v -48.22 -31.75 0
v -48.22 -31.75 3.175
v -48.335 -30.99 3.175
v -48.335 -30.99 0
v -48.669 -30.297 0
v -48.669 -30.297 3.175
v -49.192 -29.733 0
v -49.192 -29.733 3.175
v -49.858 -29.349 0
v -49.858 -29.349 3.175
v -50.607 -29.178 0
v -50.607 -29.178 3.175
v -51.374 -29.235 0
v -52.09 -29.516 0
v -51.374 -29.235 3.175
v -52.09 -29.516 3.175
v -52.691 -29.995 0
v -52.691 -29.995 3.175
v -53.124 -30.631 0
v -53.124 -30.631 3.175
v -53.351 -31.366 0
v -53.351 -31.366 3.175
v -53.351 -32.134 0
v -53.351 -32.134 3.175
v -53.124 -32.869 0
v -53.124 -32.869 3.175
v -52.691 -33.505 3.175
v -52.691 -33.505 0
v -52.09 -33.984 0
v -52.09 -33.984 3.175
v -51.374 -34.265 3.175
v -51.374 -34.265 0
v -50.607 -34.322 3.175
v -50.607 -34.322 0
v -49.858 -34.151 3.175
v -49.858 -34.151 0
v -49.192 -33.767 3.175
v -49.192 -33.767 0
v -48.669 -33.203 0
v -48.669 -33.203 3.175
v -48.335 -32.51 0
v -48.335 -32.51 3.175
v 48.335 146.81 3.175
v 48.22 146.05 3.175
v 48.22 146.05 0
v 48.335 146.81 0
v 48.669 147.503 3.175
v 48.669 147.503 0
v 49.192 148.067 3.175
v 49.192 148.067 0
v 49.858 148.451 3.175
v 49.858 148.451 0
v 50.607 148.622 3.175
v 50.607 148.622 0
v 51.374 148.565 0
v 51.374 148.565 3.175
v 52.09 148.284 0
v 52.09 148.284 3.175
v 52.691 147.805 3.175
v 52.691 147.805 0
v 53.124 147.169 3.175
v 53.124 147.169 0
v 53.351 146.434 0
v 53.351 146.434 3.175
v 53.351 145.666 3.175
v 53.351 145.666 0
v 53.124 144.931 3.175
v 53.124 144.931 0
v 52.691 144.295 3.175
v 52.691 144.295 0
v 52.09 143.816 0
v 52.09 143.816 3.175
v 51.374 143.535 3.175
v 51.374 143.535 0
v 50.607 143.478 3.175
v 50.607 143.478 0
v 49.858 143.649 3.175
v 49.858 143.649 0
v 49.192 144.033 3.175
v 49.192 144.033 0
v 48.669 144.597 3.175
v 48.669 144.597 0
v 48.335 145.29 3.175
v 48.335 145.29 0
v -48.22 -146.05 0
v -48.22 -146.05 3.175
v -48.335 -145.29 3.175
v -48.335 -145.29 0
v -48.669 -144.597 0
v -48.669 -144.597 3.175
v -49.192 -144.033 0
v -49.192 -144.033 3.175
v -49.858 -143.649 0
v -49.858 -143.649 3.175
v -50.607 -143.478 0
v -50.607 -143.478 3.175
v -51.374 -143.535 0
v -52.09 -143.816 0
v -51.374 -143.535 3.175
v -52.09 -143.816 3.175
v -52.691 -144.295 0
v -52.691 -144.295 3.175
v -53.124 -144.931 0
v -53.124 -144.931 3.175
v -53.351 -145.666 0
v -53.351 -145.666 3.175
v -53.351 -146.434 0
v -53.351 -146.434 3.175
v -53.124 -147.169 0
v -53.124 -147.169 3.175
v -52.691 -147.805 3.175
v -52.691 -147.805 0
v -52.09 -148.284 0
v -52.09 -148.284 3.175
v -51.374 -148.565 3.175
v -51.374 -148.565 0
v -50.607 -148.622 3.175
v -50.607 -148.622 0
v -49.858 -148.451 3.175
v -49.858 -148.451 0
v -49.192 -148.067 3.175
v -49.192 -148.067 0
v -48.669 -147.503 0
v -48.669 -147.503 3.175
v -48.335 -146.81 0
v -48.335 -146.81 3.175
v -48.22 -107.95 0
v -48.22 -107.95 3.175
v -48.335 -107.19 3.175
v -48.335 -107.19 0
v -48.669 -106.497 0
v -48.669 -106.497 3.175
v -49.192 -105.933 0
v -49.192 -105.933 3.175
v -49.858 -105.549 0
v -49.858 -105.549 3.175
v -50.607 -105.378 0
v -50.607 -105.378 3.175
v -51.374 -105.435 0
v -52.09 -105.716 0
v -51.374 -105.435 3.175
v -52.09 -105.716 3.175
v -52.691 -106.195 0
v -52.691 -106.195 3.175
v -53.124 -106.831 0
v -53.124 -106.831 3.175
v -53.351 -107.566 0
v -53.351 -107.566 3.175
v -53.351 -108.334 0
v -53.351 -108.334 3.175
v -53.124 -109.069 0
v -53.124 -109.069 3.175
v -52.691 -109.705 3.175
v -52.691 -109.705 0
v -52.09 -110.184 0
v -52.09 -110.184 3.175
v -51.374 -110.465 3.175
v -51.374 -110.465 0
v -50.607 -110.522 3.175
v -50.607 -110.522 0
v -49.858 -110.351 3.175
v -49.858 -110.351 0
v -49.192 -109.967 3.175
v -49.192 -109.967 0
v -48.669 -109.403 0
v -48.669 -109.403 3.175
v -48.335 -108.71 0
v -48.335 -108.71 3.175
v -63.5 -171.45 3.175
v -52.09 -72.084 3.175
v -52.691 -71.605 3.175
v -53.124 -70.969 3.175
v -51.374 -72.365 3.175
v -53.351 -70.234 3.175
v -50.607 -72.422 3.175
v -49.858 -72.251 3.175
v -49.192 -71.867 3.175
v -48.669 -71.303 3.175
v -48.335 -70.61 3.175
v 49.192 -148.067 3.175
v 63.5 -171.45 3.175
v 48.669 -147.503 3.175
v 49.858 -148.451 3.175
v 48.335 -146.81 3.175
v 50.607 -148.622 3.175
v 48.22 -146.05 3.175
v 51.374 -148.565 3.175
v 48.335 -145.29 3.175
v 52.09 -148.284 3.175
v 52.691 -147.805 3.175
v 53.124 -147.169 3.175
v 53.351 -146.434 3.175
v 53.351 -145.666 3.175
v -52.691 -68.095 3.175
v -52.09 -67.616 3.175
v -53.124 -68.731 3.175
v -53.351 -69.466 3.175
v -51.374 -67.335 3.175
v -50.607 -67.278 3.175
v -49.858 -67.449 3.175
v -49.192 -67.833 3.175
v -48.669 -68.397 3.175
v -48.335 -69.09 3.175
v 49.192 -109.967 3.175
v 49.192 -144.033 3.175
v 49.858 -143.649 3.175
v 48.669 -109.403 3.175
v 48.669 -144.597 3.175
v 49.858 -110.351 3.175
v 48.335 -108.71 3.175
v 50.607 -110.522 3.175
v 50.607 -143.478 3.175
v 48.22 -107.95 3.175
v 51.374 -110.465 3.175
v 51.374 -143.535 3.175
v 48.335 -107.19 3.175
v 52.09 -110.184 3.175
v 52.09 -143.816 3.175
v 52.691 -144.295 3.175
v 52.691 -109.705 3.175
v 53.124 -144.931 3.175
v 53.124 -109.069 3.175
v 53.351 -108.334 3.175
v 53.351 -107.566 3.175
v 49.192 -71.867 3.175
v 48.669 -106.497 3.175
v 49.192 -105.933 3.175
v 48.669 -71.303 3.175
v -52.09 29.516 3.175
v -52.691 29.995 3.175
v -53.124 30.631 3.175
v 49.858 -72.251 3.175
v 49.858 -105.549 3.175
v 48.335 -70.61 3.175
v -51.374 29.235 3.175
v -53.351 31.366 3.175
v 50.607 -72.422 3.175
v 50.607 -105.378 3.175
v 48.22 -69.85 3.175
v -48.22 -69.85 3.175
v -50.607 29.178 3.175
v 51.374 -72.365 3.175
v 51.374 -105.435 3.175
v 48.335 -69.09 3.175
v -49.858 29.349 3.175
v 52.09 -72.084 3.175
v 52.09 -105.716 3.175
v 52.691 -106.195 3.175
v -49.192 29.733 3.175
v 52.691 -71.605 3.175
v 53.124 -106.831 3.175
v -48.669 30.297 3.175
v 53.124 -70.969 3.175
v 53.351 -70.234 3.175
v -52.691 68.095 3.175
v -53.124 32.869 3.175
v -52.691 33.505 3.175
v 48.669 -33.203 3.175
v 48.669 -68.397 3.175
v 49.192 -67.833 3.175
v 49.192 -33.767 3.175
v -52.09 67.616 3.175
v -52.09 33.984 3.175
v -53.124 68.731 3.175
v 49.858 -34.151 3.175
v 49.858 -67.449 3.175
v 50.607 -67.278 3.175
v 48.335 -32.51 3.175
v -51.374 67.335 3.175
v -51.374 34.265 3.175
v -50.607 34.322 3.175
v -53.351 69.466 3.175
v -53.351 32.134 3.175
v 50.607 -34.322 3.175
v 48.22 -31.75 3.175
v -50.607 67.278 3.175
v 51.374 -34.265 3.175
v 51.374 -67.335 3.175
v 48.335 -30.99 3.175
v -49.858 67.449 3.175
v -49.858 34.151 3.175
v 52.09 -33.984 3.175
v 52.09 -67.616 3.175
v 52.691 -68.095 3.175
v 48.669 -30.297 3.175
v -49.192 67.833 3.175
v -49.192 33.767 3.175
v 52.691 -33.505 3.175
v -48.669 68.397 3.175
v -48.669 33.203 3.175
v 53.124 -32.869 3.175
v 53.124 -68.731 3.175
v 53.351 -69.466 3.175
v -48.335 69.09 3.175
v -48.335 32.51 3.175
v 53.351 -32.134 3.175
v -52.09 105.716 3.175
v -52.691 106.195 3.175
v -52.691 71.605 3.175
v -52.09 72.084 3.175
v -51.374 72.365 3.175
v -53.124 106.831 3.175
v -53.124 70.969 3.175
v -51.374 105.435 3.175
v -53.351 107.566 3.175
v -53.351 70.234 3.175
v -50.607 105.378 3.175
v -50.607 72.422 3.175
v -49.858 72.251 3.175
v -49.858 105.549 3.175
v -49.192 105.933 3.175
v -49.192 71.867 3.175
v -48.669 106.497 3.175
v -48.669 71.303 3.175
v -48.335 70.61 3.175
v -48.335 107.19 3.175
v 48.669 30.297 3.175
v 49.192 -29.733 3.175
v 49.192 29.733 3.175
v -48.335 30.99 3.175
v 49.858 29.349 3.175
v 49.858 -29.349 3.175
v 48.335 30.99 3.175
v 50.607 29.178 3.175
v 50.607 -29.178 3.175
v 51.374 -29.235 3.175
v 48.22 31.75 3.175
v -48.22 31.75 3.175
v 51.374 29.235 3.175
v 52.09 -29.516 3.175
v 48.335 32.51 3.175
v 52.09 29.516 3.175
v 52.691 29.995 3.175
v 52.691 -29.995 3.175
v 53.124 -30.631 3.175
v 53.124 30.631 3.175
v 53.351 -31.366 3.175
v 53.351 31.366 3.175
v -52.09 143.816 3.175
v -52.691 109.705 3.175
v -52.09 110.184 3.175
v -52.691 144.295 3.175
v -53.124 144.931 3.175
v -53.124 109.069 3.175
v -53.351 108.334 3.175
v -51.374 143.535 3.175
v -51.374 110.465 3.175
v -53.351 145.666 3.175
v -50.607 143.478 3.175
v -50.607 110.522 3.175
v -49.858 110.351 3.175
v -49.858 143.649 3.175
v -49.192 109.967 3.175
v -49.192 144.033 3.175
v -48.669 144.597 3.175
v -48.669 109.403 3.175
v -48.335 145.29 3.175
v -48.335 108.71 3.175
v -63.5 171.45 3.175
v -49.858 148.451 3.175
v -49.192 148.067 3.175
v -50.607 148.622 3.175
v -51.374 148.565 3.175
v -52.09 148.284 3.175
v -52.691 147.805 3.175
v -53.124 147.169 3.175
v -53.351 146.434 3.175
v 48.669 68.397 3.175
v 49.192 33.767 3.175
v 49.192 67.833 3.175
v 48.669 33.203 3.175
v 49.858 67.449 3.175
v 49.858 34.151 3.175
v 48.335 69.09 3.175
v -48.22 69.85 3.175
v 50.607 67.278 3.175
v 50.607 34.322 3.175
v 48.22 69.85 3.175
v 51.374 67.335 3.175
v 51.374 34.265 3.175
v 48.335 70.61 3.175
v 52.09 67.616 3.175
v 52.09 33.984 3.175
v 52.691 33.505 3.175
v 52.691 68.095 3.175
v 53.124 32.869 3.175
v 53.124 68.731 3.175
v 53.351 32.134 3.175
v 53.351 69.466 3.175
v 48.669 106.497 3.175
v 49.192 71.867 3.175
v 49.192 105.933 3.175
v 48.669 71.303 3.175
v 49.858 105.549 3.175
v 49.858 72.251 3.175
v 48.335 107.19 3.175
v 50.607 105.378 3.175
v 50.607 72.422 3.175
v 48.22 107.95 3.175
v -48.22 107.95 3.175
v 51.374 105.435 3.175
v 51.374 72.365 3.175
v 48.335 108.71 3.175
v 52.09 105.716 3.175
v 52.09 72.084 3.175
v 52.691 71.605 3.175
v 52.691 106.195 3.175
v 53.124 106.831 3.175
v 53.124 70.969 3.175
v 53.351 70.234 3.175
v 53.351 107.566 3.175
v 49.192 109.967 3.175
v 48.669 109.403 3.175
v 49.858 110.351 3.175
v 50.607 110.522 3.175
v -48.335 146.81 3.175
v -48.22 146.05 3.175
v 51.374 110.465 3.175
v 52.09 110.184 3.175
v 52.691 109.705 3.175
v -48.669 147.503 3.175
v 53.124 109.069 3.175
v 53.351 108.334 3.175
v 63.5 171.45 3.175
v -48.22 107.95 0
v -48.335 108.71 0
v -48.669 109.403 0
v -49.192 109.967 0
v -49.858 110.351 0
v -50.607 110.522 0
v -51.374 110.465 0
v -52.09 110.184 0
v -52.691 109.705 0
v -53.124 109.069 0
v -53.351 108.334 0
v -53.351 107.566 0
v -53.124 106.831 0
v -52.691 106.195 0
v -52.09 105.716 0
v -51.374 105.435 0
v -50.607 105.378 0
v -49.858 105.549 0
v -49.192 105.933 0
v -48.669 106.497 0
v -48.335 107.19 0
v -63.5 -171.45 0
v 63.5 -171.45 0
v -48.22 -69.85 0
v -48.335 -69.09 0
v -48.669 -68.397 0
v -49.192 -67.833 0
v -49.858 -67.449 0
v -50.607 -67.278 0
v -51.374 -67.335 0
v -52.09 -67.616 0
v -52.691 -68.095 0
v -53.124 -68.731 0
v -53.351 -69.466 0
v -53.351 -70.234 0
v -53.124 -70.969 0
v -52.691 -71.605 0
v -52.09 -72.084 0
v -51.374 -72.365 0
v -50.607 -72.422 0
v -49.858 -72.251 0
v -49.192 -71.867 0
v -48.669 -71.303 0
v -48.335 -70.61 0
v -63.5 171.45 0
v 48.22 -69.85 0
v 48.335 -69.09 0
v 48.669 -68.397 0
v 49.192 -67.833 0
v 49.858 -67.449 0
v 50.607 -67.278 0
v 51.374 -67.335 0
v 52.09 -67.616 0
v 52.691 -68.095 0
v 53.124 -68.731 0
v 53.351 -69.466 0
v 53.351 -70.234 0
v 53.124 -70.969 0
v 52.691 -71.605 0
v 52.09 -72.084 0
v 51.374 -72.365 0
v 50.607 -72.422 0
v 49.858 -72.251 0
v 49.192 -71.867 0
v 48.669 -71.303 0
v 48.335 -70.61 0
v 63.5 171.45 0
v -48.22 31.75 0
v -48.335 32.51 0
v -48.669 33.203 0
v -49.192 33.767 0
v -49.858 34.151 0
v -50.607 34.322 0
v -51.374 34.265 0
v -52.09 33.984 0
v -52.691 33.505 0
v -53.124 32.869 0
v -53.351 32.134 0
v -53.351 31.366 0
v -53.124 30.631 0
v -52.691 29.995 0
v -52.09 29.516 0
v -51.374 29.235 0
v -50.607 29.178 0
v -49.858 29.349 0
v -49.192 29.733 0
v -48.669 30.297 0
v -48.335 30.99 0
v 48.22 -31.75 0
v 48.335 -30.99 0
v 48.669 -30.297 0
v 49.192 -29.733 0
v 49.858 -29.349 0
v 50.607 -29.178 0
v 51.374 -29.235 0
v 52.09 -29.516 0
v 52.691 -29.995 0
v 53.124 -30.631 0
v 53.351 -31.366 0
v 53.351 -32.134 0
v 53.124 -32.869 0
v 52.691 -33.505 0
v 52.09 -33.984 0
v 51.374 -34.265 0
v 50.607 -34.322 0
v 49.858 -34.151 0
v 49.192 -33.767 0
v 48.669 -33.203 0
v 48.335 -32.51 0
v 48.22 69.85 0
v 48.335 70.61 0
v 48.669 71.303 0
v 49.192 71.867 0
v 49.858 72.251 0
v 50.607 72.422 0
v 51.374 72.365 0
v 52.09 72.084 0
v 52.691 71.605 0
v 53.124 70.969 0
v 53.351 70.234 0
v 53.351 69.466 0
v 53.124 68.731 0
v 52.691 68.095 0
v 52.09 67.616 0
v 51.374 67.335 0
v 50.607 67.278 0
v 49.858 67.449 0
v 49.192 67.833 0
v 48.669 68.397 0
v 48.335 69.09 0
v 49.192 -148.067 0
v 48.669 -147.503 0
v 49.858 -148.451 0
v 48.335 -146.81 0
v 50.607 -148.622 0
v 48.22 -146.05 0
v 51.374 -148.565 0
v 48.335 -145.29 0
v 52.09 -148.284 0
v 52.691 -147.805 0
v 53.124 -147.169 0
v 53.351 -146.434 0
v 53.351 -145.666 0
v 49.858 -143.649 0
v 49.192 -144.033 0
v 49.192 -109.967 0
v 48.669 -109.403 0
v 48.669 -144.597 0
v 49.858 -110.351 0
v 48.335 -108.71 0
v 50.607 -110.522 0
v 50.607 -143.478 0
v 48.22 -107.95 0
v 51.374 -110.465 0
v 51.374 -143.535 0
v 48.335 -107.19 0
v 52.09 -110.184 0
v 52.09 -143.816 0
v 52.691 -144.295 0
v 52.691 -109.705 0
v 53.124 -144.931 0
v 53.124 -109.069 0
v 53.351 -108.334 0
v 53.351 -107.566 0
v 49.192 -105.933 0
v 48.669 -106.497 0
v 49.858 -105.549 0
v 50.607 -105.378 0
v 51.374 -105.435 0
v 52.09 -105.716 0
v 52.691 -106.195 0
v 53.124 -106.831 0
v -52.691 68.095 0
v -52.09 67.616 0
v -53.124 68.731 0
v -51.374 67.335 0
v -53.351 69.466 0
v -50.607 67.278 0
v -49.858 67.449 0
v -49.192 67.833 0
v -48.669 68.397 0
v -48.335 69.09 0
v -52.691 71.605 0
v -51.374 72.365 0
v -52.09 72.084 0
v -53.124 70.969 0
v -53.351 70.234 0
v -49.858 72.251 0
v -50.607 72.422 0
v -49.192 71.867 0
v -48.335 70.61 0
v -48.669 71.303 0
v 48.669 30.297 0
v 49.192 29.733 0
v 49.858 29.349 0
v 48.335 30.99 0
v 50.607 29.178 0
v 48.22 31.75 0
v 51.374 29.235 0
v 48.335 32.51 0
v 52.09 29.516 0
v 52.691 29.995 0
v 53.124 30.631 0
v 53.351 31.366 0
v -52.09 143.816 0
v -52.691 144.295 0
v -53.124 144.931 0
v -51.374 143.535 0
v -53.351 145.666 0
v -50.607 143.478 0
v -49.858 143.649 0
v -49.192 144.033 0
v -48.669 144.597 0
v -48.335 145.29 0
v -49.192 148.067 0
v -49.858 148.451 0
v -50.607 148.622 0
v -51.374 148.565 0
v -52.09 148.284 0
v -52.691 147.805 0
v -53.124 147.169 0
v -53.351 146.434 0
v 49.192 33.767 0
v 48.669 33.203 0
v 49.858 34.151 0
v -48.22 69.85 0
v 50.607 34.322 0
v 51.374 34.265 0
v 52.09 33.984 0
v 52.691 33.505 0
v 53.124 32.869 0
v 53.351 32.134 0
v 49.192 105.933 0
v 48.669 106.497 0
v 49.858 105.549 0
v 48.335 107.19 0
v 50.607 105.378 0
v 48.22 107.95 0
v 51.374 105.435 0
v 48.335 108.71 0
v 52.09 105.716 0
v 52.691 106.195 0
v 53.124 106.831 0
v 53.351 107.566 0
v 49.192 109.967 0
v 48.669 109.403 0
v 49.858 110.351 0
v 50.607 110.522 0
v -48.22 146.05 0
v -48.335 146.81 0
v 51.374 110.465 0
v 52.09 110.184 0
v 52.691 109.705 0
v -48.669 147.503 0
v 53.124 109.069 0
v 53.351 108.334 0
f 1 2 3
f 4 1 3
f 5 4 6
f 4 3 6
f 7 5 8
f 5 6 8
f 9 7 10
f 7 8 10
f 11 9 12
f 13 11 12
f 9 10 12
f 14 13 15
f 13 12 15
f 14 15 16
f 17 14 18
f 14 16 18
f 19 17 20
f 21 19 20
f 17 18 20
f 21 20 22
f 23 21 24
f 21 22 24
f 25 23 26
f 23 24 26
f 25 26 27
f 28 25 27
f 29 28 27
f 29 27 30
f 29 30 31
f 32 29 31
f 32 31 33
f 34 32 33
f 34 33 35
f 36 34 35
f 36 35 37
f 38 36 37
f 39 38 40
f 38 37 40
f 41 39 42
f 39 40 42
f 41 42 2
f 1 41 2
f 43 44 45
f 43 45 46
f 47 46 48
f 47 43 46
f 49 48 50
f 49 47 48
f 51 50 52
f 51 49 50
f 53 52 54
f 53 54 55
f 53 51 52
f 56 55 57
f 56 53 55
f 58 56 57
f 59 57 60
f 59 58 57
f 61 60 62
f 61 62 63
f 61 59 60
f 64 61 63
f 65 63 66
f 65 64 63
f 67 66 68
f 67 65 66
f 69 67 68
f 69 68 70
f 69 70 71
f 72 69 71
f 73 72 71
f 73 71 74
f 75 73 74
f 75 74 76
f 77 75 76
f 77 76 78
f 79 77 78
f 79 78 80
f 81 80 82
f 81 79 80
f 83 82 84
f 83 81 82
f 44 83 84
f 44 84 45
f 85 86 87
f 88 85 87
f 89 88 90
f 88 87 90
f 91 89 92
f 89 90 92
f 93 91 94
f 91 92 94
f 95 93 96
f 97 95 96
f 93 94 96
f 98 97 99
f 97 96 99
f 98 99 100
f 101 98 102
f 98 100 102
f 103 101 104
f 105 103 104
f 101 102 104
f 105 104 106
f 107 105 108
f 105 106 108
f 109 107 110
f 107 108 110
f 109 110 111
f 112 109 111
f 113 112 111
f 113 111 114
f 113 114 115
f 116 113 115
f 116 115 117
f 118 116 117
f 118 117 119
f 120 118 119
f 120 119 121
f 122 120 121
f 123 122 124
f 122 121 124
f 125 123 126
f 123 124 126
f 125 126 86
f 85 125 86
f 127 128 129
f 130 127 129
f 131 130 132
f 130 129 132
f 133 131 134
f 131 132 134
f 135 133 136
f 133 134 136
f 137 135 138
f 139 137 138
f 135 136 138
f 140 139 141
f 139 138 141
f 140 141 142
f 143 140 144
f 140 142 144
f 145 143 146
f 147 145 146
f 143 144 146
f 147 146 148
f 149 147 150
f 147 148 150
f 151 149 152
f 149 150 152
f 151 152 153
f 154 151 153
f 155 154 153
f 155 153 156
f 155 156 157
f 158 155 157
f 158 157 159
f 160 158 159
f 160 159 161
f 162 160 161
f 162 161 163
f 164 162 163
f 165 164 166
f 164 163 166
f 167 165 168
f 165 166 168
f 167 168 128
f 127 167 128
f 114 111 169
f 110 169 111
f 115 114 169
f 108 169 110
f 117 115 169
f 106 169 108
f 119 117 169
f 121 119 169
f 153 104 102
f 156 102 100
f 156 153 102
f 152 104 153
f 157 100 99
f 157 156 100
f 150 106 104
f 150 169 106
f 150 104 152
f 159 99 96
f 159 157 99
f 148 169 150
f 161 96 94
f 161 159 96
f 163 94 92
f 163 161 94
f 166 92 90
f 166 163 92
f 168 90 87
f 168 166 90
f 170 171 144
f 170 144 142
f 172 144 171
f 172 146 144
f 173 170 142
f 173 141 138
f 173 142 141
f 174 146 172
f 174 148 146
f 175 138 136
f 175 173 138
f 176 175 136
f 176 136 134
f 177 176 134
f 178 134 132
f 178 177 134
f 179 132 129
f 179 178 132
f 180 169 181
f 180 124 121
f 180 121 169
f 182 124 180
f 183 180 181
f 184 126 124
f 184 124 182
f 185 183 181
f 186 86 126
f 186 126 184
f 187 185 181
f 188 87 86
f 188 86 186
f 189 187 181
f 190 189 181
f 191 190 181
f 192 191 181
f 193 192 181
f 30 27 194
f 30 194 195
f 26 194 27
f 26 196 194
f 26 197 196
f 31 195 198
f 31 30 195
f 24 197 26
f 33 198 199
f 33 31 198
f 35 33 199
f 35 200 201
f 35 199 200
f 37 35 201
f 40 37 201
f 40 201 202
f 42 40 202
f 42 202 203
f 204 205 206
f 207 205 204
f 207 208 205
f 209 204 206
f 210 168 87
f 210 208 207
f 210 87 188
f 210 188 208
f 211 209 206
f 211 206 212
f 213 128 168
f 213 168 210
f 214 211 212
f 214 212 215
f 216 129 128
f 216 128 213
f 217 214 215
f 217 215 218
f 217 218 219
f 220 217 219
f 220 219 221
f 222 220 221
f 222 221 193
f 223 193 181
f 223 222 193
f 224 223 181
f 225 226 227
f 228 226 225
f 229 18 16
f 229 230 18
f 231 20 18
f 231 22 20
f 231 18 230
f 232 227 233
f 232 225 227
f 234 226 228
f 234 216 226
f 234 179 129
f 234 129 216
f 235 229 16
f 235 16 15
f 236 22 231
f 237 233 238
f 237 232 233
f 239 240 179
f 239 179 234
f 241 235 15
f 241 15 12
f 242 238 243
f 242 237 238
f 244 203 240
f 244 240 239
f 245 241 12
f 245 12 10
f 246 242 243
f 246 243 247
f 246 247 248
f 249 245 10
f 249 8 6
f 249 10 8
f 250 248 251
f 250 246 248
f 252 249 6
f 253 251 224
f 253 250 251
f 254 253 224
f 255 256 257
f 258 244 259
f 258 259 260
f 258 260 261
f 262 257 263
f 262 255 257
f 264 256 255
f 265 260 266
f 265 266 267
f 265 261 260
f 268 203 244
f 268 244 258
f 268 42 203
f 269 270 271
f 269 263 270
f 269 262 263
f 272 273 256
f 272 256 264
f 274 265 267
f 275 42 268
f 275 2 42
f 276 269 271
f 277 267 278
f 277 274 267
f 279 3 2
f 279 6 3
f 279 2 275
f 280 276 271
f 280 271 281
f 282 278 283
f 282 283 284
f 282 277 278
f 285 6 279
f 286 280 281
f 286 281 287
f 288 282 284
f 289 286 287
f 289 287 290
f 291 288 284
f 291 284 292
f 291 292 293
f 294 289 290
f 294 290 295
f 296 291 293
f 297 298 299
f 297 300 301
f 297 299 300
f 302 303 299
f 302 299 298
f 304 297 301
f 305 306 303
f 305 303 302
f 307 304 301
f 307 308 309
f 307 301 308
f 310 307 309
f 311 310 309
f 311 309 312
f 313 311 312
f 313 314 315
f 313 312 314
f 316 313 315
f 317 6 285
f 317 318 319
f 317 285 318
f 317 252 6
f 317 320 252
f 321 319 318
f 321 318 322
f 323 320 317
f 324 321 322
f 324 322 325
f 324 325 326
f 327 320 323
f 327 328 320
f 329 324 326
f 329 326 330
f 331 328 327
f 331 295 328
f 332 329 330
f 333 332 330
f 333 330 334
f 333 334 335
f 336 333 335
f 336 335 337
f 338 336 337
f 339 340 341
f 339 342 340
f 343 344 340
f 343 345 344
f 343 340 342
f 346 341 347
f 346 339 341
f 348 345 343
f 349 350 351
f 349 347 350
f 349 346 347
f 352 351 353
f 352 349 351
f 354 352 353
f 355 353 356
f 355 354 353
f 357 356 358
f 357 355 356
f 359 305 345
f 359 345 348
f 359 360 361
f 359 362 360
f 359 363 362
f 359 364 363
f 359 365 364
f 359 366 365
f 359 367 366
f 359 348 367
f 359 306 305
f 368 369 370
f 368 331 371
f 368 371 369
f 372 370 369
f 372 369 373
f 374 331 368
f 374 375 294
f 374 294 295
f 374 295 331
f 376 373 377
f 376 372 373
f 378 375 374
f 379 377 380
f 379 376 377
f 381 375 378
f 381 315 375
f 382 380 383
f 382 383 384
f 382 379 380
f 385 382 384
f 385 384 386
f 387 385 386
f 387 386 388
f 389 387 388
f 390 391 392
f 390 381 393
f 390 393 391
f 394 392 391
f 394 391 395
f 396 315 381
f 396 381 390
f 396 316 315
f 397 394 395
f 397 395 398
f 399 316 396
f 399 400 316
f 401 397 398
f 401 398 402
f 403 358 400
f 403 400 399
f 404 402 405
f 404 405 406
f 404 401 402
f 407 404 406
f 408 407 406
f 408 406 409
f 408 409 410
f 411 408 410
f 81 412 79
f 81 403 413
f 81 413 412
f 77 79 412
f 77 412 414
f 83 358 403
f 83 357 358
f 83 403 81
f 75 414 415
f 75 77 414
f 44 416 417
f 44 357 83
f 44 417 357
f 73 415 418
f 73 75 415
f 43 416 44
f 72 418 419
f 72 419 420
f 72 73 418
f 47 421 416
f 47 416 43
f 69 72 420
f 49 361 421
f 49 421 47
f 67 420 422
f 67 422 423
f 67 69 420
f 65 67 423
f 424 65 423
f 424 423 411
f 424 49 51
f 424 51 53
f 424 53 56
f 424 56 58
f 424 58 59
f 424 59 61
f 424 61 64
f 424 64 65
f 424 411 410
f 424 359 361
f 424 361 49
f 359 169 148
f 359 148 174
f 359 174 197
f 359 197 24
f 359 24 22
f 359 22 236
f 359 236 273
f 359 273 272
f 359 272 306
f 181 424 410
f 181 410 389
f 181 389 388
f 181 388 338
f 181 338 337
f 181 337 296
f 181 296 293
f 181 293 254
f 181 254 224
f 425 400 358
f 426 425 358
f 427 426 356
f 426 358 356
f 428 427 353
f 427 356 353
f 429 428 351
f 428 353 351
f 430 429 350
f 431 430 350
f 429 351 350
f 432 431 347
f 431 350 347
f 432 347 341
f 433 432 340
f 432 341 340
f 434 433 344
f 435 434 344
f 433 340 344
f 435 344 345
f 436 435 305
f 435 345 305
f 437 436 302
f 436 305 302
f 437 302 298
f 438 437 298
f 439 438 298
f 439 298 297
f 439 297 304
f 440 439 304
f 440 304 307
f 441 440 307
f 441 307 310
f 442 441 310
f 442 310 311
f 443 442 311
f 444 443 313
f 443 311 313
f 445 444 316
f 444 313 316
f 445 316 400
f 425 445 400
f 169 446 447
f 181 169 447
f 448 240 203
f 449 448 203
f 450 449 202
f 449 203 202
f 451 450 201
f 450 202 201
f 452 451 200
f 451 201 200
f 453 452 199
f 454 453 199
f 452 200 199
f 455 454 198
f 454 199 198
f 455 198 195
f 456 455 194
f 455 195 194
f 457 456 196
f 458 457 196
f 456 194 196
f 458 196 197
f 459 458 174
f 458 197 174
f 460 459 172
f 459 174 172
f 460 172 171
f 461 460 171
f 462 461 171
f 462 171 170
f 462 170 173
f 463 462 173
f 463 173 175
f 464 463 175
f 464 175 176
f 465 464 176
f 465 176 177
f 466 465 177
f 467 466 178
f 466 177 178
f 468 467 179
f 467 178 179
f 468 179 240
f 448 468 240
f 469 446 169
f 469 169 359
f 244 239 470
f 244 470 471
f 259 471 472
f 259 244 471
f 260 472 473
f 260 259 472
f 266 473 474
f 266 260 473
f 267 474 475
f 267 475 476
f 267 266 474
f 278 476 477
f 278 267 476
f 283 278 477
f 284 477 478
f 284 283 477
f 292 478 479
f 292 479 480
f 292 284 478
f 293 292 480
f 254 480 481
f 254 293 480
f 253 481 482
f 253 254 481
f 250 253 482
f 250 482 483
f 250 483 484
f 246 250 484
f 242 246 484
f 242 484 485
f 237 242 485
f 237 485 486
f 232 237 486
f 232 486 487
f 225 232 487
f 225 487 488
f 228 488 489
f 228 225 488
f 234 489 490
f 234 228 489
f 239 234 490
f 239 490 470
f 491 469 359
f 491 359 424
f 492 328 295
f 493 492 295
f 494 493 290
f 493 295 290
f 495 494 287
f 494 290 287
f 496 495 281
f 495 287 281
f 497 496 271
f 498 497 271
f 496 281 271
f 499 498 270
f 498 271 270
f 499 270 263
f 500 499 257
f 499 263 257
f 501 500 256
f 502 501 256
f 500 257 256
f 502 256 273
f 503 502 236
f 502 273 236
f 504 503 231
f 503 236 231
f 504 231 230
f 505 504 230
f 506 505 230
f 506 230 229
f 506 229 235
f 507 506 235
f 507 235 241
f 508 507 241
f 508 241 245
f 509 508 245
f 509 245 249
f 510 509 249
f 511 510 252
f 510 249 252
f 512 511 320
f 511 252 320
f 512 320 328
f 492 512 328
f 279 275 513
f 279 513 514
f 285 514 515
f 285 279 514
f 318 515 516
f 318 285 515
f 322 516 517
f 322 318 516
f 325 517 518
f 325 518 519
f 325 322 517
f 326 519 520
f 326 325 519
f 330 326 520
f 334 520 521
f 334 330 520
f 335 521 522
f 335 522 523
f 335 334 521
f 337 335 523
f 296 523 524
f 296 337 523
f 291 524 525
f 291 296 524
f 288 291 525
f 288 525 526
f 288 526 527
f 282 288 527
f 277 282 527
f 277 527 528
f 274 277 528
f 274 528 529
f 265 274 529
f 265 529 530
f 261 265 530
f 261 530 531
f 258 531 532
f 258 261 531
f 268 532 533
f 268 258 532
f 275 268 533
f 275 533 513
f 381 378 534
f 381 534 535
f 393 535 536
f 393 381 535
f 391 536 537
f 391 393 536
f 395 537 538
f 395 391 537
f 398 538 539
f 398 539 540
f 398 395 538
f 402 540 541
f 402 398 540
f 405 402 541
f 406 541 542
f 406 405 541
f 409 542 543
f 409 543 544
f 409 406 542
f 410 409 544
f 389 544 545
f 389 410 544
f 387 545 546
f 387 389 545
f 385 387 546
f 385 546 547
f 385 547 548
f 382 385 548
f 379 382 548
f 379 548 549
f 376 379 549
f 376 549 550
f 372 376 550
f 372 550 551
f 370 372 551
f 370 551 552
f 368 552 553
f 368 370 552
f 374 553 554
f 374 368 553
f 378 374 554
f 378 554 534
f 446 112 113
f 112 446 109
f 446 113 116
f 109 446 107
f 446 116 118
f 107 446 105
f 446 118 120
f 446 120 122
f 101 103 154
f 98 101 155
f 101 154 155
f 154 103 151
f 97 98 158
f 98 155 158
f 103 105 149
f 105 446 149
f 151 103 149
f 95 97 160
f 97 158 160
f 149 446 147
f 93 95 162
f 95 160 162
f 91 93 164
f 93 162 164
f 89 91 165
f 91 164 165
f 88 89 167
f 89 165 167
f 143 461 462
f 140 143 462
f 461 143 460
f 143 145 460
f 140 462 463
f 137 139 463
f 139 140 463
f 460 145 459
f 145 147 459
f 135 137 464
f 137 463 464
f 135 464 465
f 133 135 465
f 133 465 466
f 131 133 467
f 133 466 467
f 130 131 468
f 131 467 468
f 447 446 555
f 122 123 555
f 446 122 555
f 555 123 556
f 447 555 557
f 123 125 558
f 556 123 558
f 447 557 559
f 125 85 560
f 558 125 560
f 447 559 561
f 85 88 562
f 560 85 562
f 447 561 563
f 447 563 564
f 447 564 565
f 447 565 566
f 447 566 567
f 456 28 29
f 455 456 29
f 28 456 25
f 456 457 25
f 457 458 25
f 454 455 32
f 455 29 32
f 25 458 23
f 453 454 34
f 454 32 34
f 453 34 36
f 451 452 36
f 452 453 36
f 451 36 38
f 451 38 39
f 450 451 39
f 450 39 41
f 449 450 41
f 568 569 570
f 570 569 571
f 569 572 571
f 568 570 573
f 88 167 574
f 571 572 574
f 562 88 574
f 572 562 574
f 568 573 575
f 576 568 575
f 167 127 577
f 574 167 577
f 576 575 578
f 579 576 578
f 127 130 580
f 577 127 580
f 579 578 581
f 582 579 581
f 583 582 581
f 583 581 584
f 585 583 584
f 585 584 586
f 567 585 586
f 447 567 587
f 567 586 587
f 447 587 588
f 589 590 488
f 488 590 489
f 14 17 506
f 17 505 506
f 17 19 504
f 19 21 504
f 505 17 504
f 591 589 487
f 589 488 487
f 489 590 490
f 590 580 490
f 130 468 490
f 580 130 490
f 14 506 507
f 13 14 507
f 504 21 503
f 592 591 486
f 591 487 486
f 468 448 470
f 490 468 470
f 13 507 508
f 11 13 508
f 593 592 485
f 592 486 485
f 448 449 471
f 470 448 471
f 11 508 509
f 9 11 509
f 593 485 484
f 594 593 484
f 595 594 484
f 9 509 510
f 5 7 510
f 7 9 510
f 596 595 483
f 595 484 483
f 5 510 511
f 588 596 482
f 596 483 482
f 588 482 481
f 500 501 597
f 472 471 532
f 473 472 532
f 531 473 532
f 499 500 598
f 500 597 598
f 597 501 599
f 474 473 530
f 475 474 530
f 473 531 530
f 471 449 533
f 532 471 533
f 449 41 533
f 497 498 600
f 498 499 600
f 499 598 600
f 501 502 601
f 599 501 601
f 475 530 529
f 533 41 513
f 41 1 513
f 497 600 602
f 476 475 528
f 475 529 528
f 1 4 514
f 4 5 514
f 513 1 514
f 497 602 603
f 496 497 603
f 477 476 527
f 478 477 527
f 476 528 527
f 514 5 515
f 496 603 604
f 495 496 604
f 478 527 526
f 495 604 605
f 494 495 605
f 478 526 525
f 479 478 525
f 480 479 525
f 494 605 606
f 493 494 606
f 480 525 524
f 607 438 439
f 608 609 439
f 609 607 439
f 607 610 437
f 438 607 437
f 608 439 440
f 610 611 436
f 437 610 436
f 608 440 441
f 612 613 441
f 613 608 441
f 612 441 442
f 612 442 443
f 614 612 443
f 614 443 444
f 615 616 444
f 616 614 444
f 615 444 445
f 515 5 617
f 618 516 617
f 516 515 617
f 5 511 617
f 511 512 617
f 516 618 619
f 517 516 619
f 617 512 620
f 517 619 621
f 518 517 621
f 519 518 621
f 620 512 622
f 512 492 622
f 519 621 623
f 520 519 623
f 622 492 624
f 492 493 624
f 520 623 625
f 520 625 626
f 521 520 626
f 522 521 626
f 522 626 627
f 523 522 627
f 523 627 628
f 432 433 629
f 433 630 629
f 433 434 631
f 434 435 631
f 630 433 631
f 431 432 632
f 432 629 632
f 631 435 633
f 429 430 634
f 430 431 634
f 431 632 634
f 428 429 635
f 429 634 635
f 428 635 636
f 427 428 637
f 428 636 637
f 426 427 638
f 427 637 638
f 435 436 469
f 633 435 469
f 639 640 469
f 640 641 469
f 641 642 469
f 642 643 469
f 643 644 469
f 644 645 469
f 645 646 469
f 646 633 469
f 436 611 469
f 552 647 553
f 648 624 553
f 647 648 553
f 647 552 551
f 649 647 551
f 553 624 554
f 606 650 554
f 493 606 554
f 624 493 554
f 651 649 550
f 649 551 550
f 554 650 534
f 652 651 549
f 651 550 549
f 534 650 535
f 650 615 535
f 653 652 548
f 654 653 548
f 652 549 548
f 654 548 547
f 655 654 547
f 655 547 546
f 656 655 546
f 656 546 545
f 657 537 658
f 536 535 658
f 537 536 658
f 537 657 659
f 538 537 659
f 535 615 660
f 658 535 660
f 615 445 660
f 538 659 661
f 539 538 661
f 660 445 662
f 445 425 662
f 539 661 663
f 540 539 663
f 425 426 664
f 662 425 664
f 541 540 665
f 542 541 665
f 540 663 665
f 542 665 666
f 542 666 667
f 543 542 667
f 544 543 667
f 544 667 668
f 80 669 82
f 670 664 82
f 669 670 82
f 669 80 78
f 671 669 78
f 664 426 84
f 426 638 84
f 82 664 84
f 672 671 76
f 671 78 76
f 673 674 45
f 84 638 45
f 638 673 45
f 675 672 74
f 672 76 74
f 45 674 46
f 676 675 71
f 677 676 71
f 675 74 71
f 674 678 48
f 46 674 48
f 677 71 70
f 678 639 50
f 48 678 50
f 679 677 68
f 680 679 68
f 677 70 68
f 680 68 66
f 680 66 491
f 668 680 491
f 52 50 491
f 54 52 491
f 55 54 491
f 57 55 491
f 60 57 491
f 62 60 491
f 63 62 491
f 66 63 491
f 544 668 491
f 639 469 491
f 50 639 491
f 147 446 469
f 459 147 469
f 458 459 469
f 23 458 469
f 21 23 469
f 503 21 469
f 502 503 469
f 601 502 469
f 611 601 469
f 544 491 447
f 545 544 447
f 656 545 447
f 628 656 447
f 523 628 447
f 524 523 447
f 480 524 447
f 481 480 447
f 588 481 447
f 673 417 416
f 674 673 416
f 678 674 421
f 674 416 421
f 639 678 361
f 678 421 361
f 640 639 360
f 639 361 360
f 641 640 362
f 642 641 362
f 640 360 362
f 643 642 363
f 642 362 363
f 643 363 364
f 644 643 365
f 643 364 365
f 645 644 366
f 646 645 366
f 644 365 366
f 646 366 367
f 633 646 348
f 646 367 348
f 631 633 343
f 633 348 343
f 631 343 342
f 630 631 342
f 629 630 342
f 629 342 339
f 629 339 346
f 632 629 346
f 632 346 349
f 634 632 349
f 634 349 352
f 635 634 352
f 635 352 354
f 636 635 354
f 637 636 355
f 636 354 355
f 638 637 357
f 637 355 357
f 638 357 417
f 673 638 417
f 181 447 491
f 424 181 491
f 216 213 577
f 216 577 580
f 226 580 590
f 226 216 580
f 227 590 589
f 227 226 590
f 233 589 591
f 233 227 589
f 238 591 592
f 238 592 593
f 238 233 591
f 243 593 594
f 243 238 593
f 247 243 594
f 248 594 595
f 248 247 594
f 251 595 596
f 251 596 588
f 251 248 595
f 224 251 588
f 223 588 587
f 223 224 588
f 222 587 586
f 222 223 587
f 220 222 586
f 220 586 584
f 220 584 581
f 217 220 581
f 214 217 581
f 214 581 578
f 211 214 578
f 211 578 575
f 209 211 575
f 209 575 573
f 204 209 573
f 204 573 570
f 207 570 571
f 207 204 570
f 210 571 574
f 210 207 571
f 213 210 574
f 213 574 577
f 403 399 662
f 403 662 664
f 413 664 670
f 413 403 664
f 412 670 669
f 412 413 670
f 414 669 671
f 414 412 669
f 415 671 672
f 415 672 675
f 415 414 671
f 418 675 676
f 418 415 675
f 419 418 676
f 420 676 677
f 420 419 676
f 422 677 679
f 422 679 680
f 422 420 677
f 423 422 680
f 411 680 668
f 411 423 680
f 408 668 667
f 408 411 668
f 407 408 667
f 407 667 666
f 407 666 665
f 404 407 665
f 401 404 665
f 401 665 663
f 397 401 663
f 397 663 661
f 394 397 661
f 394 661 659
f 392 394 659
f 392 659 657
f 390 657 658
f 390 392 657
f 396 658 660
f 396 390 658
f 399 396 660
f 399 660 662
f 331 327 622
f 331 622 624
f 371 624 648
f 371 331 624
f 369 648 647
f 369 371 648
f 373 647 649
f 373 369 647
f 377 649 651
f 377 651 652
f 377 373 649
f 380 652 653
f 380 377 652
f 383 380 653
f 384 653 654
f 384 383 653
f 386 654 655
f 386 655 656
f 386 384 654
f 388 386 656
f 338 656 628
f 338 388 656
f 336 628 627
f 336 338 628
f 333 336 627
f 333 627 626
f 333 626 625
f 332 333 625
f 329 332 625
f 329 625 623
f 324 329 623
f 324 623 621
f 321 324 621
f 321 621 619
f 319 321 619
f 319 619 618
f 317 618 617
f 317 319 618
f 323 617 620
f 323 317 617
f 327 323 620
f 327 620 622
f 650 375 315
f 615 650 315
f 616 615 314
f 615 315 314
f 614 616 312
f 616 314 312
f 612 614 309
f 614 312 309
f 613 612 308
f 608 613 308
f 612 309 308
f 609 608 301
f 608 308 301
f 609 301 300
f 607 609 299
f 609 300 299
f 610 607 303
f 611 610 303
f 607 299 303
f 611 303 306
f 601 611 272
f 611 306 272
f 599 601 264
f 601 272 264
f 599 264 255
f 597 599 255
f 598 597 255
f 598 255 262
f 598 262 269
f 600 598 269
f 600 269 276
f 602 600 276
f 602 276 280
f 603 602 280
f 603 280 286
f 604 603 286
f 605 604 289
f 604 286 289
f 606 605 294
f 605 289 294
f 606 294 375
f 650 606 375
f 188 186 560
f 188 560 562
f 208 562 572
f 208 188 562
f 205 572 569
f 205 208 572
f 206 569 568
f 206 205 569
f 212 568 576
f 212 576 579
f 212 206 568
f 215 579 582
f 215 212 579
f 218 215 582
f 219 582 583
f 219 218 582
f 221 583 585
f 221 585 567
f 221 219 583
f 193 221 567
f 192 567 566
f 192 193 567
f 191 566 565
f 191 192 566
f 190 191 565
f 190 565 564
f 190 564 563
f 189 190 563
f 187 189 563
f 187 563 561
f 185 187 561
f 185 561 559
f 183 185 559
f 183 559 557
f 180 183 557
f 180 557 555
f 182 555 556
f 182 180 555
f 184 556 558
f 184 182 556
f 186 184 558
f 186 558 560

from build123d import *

# Parameters (mm, degrees)
SKETCH1_W           = 127
SKETCH1_H           = 342.9
BOSS_EXTRUDE1_DEPTH = 3.175
SKETCH2_R           = 2.5796875
CUT_EXTRUDE1_DEPTH  = 3.175


with BuildPart() as part:
    # Sketch1 → Boss-Extrude1 (new body)
    with BuildSketch(Plane.XY):
        Rectangle(SKETCH1_W, SKETCH1_H)
    extrude(amount=BOSS_EXTRUDE1_DEPTH)

    # Sketch2 → Cut-Extrude1 (cut)
    with BuildSketch(Plane.XY.offset(3.175)):
        with Locations((-50.8, -146.05)):
            Circle(SKETCH2_R)
        with Locations((-50.8, -107.95)):
            Circle(SKETCH2_R)
        with Locations((-50.8, -69.85)):
            Circle(SKETCH2_R)
        with Locations((-50.8, 69.85)):
            Circle(SKETCH2_R)
        with Locations((-50.8, 107.95)):
            Circle(SKETCH2_R)
        with Locations((-50.8, 146.05)):
            Circle(SKETCH2_R)
        with Locations((-50.8, 31.75)):
            Circle(SKETCH2_R)
        with Locations((-50.8, -31.75)):
            Circle(SKETCH2_R)
    cut_extrude1 = extrude(amount=-CUT_EXTRUDE1_DEPTH, mode=Mode.SUBTRACT)

    # Mirror1: Cut-Extrude1 across plane
    add(cut_extrude1.mirror(Plane(origin=(0, 0, 0), x_dir=(0, 0, 1), z_dir=(1, 0, 0))), mode=Mode.SUBTRACT)


solid = part.part
